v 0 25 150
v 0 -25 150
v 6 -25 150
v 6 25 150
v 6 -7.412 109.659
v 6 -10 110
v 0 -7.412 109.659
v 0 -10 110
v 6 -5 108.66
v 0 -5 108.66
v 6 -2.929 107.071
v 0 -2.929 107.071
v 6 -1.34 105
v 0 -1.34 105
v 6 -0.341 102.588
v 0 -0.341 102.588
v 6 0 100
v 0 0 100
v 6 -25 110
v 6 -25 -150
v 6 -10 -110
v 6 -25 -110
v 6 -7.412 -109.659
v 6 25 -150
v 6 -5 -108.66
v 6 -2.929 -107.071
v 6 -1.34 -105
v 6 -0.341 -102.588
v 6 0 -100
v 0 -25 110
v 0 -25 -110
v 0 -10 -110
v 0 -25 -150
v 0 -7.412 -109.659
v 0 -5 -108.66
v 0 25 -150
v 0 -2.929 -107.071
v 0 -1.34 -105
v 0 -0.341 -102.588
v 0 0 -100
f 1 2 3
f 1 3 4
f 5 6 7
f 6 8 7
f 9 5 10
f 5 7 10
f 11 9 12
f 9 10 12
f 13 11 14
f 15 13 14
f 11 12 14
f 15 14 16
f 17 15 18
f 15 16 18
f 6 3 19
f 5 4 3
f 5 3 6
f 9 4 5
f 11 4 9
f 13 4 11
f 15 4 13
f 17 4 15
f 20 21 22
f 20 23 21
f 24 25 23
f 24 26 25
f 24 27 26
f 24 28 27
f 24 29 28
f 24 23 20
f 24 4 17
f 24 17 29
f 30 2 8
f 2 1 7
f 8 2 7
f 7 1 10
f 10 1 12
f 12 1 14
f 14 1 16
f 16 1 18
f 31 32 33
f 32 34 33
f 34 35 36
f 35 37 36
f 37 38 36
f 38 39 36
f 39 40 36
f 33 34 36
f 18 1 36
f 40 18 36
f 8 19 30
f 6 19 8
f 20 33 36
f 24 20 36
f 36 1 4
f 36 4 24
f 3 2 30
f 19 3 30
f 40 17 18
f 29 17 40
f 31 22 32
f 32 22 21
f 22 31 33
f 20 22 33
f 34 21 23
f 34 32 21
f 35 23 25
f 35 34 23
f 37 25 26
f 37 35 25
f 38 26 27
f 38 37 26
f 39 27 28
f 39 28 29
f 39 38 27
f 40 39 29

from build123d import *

# Parameters (mm, degrees)
SKETCH1_W           = 300
SKETCH1_H           = 50
BOSS_EXTRUDE1_DEPTH = 6
SKETCH2_W           = 220
SKETCH2_H           = 25
CUT_EXTRUDE1_DEPTH  = 10
FILLET1_R           = 10


with BuildPart() as part:
    # Sketch1 → Boss-Extrude1 (new body)
    with BuildSketch(Plane(origin=(0, 0, 0), x_dir=(0, 0, -1), z_dir=(1, 0, 0))):
        Rectangle(SKETCH1_W, SKETCH1_H)
    extrude(amount=BOSS_EXTRUDE1_DEPTH)

    # Sketch2 → Cut-Extrude1 (cut)
    with BuildSketch(Plane(origin=(6, 0, 0), x_dir=(0, 0, -1), z_dir=(1, 0, 0))):
        with Locations((0, -12.5)):
            Rectangle(SKETCH2_W, SKETCH2_H)
    extrude(amount=-CUT_EXTRUDE1_DEPTH, mode=Mode.SUBTRACT)

    # Fillet1
    fillet1_edges = [part.edges().sort_by_distance(p)[0] for p in [
        (3, 0, 110),
        (3, 0, -110),
    ]]
    fillet(fillet1_edges, radius=FILLET1_R)


solid = part.part
